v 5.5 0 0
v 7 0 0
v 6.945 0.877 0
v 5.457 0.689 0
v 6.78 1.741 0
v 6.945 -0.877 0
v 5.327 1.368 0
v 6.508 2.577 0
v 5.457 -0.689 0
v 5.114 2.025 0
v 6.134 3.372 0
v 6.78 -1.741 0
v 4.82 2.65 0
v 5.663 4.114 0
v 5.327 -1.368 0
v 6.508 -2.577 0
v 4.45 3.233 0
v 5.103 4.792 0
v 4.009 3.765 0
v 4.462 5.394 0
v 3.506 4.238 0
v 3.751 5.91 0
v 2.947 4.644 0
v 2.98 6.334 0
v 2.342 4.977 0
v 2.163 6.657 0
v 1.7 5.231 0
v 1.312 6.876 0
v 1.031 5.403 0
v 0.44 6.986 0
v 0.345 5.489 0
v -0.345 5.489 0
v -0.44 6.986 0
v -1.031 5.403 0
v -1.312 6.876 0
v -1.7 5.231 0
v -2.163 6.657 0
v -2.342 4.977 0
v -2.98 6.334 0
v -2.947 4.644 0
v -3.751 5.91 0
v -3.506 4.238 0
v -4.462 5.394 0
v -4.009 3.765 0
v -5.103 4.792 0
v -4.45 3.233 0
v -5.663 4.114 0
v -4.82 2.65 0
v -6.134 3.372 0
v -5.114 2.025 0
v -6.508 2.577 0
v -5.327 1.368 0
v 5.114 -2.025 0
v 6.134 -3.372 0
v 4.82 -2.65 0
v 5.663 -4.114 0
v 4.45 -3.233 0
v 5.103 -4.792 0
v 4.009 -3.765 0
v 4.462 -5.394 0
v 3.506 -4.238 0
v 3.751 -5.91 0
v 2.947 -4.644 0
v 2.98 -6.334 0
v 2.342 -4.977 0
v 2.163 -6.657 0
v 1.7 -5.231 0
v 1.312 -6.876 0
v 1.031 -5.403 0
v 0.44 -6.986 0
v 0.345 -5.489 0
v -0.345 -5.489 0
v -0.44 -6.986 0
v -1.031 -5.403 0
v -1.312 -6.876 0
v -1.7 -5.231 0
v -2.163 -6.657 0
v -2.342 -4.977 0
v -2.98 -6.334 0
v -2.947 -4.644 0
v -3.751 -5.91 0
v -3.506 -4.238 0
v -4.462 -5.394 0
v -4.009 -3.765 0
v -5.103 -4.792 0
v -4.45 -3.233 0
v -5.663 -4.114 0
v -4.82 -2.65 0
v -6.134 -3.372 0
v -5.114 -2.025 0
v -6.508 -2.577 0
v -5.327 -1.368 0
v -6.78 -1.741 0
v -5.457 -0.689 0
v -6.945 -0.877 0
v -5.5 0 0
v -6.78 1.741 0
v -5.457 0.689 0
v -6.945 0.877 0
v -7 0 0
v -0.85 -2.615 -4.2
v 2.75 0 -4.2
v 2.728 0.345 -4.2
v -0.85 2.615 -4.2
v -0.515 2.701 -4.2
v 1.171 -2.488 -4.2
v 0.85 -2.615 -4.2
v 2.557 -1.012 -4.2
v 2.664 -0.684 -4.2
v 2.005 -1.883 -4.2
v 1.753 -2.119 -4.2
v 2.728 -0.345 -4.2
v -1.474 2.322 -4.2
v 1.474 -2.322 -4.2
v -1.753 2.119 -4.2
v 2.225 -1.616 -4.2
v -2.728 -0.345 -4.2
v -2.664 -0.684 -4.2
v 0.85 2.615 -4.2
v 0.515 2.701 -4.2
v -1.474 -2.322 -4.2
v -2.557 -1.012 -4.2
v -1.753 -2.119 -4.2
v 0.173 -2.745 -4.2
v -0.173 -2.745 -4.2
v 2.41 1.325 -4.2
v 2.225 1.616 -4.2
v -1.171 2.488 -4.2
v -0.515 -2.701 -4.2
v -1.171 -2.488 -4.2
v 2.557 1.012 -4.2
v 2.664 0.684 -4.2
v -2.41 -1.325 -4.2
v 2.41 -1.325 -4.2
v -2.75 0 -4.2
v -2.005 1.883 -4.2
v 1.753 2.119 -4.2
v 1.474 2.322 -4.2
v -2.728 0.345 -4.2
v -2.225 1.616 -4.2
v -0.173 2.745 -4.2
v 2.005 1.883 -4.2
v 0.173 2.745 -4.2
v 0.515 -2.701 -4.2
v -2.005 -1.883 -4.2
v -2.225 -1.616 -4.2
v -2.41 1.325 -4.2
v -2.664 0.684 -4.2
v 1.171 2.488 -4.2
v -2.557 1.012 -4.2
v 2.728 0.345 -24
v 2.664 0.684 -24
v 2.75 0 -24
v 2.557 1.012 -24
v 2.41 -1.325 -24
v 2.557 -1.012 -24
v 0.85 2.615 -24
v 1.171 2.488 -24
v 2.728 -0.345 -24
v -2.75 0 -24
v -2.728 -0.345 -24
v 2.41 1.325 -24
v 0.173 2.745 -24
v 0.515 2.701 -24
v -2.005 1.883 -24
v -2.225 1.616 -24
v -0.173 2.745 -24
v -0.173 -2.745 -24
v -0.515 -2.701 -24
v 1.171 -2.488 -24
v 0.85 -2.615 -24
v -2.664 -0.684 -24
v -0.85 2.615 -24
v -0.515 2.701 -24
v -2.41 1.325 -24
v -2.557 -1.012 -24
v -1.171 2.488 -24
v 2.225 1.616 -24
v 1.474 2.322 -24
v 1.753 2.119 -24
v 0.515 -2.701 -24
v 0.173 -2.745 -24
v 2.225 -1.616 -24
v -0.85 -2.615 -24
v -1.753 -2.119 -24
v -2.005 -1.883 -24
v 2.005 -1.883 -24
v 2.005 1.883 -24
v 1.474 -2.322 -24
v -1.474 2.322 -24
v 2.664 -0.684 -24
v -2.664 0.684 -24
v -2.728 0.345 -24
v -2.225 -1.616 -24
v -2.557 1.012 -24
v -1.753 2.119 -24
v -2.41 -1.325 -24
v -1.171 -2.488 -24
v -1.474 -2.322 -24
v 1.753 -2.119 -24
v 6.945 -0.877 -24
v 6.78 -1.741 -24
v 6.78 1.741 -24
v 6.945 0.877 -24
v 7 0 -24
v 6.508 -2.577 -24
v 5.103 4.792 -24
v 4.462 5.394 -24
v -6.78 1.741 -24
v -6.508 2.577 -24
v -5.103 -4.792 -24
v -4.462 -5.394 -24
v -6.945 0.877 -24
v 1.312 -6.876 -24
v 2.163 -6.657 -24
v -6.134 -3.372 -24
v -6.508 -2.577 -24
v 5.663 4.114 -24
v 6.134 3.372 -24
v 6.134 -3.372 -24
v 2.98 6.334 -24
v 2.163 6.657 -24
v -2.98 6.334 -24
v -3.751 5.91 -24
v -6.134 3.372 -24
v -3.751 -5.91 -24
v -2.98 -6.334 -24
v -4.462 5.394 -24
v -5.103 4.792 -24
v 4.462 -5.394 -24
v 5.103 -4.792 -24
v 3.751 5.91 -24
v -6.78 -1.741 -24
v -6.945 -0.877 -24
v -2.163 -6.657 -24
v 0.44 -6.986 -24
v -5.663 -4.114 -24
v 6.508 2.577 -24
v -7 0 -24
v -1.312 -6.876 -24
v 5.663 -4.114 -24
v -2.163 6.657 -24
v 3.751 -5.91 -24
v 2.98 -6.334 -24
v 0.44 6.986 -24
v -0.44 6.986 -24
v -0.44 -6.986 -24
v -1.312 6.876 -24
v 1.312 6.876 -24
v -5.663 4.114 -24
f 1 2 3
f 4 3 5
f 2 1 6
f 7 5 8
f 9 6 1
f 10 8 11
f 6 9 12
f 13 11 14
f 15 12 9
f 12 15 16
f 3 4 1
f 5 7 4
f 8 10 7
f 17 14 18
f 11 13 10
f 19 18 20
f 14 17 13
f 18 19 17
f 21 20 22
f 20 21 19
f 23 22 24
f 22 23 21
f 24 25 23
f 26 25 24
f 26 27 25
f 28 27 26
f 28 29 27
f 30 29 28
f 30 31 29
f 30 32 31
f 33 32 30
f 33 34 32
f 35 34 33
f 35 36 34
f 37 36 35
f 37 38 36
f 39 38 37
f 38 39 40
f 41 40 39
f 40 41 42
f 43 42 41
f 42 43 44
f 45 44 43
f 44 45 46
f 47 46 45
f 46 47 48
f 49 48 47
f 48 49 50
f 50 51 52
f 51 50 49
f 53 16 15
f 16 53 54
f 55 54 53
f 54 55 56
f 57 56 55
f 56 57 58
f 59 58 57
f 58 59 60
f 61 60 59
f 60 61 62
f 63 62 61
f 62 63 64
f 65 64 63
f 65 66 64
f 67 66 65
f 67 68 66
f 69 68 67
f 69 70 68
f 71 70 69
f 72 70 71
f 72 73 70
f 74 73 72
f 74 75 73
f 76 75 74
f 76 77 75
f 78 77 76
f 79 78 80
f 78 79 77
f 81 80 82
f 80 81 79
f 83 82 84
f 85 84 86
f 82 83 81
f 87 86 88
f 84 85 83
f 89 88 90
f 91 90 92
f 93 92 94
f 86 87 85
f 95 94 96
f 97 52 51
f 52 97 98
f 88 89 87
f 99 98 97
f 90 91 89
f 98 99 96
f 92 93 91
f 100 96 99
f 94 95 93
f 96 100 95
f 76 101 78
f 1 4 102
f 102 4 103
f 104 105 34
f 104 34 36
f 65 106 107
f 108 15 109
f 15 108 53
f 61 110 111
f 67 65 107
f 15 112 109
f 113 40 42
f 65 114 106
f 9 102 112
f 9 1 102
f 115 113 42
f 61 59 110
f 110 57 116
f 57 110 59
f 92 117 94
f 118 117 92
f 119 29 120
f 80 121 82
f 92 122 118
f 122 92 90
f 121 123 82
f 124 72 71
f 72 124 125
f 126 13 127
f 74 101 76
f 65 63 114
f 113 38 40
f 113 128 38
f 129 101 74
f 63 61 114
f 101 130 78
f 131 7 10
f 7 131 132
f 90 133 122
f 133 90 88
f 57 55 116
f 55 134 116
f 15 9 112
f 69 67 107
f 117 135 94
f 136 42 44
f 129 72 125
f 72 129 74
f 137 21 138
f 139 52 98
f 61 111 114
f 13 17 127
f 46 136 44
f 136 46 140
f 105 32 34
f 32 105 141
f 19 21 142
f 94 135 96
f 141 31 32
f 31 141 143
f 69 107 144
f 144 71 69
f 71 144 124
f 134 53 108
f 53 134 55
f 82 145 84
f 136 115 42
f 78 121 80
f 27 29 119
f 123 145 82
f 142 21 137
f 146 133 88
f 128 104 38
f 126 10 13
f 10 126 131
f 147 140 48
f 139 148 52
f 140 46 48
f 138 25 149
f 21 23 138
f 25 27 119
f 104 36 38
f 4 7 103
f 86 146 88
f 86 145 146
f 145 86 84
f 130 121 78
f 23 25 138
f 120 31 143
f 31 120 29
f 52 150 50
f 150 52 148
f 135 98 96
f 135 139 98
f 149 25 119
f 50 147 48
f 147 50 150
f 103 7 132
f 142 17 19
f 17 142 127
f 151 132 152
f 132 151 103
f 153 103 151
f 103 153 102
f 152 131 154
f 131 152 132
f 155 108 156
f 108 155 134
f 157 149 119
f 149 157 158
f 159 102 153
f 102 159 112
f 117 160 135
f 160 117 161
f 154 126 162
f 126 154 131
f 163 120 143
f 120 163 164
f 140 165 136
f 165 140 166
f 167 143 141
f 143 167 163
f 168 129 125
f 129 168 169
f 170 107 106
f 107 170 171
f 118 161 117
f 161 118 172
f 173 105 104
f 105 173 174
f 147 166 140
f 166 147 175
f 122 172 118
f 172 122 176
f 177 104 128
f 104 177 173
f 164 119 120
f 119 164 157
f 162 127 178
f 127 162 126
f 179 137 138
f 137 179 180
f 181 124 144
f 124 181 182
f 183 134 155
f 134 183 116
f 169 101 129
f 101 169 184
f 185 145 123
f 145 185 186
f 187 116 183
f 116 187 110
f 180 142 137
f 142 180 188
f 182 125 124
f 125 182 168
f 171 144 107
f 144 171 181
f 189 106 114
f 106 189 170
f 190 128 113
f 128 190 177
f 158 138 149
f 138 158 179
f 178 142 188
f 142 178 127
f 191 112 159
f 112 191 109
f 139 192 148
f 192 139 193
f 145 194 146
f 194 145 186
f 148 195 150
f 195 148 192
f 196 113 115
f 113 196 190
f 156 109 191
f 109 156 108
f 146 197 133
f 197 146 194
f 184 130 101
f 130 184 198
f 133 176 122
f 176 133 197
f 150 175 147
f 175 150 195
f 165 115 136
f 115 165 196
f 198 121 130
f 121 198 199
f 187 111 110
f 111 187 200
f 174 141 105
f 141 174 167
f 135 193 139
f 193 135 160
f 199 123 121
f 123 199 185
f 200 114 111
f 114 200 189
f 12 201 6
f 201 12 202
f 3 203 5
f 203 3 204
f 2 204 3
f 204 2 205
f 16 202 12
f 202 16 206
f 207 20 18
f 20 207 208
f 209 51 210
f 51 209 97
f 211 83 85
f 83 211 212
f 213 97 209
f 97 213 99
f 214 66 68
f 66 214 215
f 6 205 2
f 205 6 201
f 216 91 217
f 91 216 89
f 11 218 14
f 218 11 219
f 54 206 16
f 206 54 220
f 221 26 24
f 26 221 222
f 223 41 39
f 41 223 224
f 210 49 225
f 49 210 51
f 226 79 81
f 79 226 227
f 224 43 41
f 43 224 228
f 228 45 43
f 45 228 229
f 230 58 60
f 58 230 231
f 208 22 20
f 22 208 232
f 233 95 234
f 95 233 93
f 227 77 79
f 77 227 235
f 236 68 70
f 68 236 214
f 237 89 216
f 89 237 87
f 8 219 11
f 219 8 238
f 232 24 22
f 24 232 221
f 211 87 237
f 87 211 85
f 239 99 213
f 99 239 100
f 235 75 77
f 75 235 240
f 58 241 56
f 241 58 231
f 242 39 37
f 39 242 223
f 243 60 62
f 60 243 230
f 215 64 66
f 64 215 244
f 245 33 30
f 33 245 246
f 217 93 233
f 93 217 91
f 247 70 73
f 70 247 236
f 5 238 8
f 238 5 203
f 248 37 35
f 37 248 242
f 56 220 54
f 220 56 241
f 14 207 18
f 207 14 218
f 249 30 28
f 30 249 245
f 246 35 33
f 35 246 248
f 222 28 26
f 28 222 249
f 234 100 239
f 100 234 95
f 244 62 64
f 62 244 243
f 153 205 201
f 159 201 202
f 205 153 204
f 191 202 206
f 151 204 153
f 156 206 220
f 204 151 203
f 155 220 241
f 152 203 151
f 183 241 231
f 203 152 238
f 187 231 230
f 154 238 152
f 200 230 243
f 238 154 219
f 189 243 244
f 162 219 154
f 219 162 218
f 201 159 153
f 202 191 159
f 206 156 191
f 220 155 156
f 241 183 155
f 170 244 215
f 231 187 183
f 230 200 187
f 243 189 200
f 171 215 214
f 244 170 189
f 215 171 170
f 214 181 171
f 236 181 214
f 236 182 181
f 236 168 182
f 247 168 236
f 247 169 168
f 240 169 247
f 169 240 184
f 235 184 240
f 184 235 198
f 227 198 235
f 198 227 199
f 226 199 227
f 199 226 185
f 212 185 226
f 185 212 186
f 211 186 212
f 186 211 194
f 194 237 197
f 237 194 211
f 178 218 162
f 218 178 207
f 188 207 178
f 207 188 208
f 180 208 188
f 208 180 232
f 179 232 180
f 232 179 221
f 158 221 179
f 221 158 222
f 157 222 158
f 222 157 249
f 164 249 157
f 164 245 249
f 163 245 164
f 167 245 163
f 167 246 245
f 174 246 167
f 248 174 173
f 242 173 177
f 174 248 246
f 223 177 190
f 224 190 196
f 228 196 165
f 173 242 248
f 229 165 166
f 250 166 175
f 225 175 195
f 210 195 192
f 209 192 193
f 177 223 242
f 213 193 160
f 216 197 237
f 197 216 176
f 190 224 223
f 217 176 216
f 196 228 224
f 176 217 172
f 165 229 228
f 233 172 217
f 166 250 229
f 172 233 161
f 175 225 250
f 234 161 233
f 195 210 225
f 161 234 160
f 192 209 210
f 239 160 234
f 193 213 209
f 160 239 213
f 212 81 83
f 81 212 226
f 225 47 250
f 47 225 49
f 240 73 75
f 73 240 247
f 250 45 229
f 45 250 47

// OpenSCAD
$fn = 50;


difference() {
	union() {
		translate(v = [0, 0, -24.0000000000]) {
			cylinder(h = 24, r = 7.0000000000);
		}
	}
	union() {
		translate(v = [0, 0, 0]) {
			rotate(a = [0, 0, 0]) {
				difference() {
					union() {
						translate(v = [0, 0, -27.0000000000]) {
							cylinder(h = 27, r = 2.2500000000);
						}
						translate(v = [0, 0, -4.2000000000]) {
							cylinder(h = 4.2000000000, r1 = 2.7500000000, r2 = 5.5000000000);
						}
						translate(v = [0, 0, -27.0000000000]) {
							cylinder(h = 27, r = 2.7500000000);
						}
						translate(v = [0, 0, -27.0000000000]) {
							cylinder(h = 27, r = 2.2500000000);
						}
					}
					union();
				}
			}
		}
	}
}
